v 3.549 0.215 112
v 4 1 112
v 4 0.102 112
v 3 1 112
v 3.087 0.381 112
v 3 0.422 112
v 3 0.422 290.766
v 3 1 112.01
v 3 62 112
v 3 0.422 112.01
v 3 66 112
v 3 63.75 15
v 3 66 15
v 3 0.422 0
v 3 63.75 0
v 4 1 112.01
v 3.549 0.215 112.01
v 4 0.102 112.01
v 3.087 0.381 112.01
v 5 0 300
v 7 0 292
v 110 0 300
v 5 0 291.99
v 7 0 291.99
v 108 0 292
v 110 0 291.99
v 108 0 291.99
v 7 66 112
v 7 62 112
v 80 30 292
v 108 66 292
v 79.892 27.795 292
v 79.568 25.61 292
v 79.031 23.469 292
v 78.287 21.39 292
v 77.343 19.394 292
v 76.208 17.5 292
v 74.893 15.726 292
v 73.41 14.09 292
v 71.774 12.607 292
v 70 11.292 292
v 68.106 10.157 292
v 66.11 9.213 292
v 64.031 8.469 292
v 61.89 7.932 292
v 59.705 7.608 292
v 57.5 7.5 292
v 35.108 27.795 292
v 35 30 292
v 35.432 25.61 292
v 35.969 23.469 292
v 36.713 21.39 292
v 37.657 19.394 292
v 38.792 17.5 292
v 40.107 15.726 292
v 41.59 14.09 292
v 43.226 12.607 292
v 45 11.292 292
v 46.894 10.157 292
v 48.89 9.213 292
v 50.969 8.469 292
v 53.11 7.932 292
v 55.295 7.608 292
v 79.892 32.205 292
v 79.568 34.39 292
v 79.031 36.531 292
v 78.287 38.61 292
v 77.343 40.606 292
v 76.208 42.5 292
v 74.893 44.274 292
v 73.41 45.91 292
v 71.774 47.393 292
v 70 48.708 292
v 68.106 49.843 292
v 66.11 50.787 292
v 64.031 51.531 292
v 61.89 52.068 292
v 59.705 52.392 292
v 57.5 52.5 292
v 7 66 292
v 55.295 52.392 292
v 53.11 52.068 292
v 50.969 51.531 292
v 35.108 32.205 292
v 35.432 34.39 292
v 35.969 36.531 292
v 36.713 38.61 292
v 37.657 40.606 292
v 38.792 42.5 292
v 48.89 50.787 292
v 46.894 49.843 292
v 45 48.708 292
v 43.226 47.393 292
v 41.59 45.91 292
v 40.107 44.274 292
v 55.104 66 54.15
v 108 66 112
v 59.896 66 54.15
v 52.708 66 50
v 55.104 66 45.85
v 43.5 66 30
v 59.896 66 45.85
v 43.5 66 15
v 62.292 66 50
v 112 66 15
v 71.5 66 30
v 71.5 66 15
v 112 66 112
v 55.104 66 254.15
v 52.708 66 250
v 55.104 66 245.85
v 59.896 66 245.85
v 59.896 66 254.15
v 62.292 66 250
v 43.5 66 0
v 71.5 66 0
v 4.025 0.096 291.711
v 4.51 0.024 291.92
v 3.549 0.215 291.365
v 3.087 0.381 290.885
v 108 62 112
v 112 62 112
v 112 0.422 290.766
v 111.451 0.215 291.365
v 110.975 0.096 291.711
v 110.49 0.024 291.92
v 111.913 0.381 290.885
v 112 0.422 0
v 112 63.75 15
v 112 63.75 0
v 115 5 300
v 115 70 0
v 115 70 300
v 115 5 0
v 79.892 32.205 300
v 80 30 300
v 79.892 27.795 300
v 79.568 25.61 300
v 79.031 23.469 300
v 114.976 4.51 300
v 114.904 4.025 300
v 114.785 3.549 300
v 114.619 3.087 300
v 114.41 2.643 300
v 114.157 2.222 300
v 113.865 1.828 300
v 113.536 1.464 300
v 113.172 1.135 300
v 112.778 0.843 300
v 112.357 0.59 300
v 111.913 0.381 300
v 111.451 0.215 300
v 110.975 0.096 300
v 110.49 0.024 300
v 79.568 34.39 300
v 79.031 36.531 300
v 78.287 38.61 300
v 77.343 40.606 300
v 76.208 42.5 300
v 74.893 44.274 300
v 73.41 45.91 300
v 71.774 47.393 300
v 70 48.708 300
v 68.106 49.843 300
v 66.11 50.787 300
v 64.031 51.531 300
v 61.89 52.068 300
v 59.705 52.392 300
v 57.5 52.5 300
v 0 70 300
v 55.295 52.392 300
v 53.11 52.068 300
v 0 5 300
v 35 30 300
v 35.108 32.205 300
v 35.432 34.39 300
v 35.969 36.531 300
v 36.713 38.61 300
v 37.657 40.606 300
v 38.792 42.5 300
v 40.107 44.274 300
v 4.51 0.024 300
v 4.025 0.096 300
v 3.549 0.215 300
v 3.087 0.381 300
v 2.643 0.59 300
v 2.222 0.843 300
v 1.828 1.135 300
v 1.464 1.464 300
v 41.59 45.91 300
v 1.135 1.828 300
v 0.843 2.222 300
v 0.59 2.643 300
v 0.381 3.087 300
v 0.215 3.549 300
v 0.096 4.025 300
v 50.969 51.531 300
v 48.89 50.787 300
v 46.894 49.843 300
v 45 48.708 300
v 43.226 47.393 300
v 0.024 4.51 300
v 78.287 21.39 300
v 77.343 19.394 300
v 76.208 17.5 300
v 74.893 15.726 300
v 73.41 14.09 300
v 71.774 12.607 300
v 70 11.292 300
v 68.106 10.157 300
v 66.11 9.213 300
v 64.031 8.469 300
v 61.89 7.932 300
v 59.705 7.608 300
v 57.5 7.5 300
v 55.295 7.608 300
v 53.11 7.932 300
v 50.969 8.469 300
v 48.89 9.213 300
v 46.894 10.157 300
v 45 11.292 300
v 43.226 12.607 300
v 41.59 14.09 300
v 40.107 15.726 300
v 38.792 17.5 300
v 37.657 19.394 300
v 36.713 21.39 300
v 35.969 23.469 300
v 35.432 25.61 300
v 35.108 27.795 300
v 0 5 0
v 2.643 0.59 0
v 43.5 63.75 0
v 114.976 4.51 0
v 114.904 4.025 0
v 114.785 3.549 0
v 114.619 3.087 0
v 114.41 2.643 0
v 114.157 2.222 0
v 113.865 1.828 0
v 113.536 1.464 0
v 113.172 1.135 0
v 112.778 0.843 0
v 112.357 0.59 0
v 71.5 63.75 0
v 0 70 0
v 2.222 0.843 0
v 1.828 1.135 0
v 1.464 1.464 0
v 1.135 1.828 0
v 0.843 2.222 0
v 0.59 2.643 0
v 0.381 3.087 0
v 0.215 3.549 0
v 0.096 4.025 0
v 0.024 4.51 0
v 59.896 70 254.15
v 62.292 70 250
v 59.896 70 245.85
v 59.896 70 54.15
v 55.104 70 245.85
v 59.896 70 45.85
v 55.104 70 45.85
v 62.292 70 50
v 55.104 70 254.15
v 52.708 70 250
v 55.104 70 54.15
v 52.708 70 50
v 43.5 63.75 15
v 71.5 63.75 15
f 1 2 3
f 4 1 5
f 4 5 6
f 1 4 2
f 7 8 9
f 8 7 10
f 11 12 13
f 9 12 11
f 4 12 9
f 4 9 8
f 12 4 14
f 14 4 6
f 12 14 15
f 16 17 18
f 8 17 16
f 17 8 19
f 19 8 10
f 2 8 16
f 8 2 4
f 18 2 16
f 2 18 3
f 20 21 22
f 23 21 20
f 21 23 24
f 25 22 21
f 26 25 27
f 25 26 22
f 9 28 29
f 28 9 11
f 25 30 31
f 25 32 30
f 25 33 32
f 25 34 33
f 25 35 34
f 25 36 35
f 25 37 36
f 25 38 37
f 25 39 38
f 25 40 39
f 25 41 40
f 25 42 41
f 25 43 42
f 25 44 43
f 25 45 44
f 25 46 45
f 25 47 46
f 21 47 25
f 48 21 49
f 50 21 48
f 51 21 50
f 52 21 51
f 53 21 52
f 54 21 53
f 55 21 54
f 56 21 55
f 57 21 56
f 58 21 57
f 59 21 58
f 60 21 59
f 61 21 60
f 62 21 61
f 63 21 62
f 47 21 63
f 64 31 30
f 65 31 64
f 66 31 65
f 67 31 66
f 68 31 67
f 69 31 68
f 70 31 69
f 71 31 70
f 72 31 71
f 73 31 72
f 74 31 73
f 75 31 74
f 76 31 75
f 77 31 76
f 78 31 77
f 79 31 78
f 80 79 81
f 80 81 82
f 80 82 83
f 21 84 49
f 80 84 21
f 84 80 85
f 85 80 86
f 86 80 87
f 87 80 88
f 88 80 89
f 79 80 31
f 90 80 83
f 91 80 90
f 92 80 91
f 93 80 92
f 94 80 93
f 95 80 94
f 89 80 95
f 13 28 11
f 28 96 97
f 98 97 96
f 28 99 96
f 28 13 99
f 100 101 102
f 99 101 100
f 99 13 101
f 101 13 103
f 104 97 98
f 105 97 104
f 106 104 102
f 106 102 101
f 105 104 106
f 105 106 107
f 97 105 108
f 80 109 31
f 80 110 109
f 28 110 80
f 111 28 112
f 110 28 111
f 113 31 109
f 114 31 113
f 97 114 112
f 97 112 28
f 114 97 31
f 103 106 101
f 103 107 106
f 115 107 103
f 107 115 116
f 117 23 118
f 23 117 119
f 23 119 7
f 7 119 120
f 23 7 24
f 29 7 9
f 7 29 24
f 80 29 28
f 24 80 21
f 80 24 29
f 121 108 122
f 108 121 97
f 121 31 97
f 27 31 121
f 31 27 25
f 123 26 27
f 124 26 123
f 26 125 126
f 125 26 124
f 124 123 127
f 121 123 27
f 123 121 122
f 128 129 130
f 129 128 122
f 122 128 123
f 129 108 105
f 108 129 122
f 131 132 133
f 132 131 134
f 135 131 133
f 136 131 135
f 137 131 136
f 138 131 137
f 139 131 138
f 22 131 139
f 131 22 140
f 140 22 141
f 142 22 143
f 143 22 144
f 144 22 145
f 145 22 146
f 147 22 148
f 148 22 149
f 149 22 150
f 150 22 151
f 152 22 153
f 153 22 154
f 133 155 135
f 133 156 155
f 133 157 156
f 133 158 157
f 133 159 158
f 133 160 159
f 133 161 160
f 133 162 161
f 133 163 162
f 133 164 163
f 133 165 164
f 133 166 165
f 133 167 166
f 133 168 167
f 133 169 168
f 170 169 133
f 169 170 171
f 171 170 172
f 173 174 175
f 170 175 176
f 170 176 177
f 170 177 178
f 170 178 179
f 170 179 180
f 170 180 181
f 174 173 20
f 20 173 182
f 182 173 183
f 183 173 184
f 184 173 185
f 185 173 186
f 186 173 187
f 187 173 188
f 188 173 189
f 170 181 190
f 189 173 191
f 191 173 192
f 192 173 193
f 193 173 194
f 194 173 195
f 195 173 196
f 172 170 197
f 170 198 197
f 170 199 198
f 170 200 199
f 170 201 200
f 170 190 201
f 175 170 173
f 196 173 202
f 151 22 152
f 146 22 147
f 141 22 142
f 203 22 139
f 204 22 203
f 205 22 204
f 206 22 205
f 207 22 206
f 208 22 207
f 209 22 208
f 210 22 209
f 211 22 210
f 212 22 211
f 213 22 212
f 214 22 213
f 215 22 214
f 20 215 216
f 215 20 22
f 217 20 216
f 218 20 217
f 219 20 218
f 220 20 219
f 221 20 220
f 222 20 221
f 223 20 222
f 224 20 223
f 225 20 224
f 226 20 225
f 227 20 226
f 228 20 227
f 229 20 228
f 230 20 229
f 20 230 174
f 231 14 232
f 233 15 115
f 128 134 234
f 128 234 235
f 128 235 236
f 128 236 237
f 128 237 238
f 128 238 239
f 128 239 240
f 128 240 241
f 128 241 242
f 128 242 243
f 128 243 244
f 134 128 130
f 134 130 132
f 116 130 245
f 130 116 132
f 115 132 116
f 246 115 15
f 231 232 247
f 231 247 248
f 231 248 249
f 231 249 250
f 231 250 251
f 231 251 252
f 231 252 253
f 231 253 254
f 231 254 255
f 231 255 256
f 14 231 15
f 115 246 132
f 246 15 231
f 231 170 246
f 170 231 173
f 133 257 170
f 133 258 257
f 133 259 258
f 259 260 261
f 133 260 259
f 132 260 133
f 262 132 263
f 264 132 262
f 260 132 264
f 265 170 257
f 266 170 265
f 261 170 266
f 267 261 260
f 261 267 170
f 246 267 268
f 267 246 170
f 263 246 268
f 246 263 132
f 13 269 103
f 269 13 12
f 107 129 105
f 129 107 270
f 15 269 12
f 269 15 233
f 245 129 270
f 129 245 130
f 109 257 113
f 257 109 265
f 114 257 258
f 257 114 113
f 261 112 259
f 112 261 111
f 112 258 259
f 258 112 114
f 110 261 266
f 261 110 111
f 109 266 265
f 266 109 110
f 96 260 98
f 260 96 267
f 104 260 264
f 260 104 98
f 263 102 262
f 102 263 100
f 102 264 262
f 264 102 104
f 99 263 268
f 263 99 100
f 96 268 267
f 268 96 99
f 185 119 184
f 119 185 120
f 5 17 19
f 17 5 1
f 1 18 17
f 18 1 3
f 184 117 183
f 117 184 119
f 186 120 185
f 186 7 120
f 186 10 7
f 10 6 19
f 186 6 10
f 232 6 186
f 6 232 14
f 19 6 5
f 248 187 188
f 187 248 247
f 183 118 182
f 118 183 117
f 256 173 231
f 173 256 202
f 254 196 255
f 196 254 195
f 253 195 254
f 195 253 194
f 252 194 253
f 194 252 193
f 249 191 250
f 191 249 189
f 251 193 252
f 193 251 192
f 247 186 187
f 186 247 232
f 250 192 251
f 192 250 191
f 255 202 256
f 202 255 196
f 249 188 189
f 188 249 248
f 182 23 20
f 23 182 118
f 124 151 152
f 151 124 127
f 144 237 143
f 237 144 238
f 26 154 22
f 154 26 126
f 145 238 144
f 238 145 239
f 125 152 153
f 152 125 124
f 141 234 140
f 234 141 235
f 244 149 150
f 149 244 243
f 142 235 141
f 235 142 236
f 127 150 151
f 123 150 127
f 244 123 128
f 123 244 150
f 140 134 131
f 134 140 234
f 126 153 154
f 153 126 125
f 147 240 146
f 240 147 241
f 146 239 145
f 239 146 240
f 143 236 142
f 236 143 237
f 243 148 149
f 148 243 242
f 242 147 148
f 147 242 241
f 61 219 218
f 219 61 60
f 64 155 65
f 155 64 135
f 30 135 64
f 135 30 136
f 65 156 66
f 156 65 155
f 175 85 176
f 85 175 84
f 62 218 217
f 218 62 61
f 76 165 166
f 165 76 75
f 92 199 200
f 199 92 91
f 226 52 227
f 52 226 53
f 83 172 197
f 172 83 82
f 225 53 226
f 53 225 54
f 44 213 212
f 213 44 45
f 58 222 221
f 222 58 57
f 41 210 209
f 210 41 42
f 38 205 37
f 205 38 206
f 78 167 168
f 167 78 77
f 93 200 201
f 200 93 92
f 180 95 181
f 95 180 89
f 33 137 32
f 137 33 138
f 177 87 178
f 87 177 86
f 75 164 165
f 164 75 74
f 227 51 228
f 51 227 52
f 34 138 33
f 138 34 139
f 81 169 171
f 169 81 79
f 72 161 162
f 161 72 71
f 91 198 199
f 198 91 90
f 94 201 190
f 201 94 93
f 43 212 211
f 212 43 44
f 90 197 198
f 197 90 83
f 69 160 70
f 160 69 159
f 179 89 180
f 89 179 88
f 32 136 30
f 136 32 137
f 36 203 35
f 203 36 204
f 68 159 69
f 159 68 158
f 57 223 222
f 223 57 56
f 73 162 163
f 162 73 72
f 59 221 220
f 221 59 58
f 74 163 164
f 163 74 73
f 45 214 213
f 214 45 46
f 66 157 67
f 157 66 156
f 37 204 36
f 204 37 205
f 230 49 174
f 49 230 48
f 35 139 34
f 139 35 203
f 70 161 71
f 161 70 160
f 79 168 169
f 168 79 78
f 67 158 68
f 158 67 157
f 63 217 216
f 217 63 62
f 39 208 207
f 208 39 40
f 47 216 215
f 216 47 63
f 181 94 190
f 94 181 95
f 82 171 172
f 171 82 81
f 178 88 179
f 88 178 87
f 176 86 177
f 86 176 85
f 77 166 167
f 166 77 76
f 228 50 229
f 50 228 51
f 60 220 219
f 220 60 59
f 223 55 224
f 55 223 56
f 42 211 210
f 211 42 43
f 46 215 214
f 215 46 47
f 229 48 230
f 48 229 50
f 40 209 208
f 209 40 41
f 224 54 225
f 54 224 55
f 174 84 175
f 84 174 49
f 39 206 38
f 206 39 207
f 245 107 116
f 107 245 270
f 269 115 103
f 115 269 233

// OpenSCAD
// === DESCRIPTION ===
// Hand Pump Wall Mount Bracket: L-shaped bracket that mounts a Camec/Breha
// hand sink pump to a metal wall inside a camp trailer.
//
// Physical context: Bolted to a vertical metal wall. The pump threads through
// a 32mm hole in the top shelf via a plastic bolt underneath. A curved hose
// exits downward from the pump barb. The user pumps the handle up and down
// repeatedly, creating significant cyclic downward and forward forces on the
// top shelf. The pump body hangs 200mm below the mounting hole, plus 100mm
// hose clearance below that.
//
// Design decisions:
//   - L-bracket with side gusset webs (not centre gusset): the pump body
//     hangs through the centre so the middle must be completely clear.
//     Triangular side webs on left and right walls provide the bracing.
//   - Open front: full hand access to tighten tap nut under shelf and
//     wall bolt nuts on back plate
//   - Printed on its back (back plate = build plate): layers are in the XY
//     plane so pumping loads (downward on shelf) are shear across layers,
//     not delamination tension. Side webs print without supports.
//   - Two wall-mount bolt holes with hex nut traps on inside face of back
//     plate — bolt from behind wall, nut captured in trap, tightened with
//     a socket/spanner from the front through the open bracket
//   - Bottom centre slot for hose routing
//   - All corners rounded (min 3mm radius), all edges chamfered
//
// In OpenSCAD preview: you see the bracket from the open/front side.
//   X = width (left-right), Y = depth (front-back, 0=front, max=wall),
//   Z = height (0=bottom edge, max=top where pump mounts).
//
// NOTE: Model is in USE orientation for preview. For print orientation,
// set view = "print" — rotates so back plate is on the build plate.
//
// Terminology -> code:
//   "back plate"      -> back_thick, back_plate()
//   "shelf" / "top"   -> shelf_thick, shelf()
//   "side walls"      -> side_thick, left_wall(), right_wall()
//   "side gussets"    -> gusset_thick, side_gussets()
//   "pump hole"       -> tap_hole_dia, tap_hole_from_wall
//   "tap nut"         -> tap_nut_dia, tap_nut_depth
//   "wall bolts"      -> wall_bolt_dia, upper_bolt_z, lower_bolt_z
//   "nut traps"       -> nut_trap_af, nut_trap_depth
//   "hose slot"       -> hose_slot_width, hose_slot_depth
//   "corner radius"   -> corner_r
//
// Common modifications:
//   Bigger pump hole       -> tap_hole_dia (add 0.3mm for PETG tolerance)
//   Move pump hole         -> tap_hole_from_wall (distance from back wall)
//   Change wall bolt size  -> wall_bolt_dia, nut_trap_af (M5=8mm AF, M6=10mm AF)
//   Move bolt positions    -> upper_bolt_z, lower_bolt_z (keep >=25mm from edges)
//   Wider hose slot        -> hose_slot_width
//   Thicker side walls     -> side_thick (must be multiple of extrusion_width)
//   Thicker gussets        -> gusset_thick (wider side webs)
//
// Overall dimensions: 115 x 70 x 300 mm (fits Bambu X1C 256x256x256 in
//   print orientation: 115 x 300 x 70 on the bed)
// Coordinate system: X = width, Y = depth (wall at back), Z = height
//   Z=0 is bottom of bracket in use-view. Build plate is the back face.

// === PRINT SETTINGS ===
// Material: PETG
// Nozzle Temp: 240C (structural, max layer bond)
// Bed Temp: 80C
// Layer Height: 0.2mm
// Walls/Perimeters: 5 (2.25mm wall thickness)
// Infill: 20% gyroid
// Supports: None required (printed on back, all overhangs self-supporting)
// Orientation: Back plate flat on build plate (rotate -90 deg around X from
//   use orientation). Set view = "print" in the file to preview this.
// Cooling: 30-40% fan (PETG standard)
// Notes: Dry PETG before printing (60-65C, 4-6 hours). Print time ~6-8 hours.

// === PARAMETERS ===
// Printer settings
nozzle_diameter = 0.4;
layer_height = 0.2;
build_x = 256;
build_y = 256;
build_z = 256;

// Main dimensions (max envelope: 300h x 115w x 70d)
bracket_height = 300;    // total height
bracket_width  = 115;    // total width (left-right)
bracket_depth  = 70;     // total depth (front-to-wall)

// Wall thicknesses
wall_thick = 2.25;       // general wall reference (5 perimeters)
shelf_thick = 8;         // top shelf — thick for pump mount rigidity
back_thick = 4;          // back plate — needs depth for nut traps
side_thick = 3;          // side walls — structural, carry gusset loads
gusset_thick = 4;        // side gusset web thickness (Y-direction slab)

// Pump mounting
tap_hole_dia = 32.3;     // 32mm + 0.3mm PETG tolerance
tap_hole_from_wall = 40; // centre of hole to wall (back face)
// Recess for plastic nut under shelf
tap_nut_dia = 45;        // estimated nut OD — measure and adjust
tap_nut_depth = 8;       // depth of recess for nut

// Wall mounting bolts (M5 bolts)
wall_bolt_dia = 5.3;     // M5 + 0.3mm tolerance
upper_bolt_z = bracket_height - 50;  // 50mm from top (as specified)
lower_bolt_z = 50;                    // 50mm from bottom for stability

// M5 hex nut trap dimensions
nut_trap_af = 8.3;       // M5 nut across-flats + 0.3mm tolerance (8mm nominal)
nut_trap_depth = 4.5;    // M5 nut thickness (4mm) + 0.5mm clearance
nut_trap_corner_r = 0.5; // slight radius to help nut seat

// Hose routing
hose_slot_width = 28;    // width of bottom hose slot (generous for hose + clamp)
hose_slot_height = 30;   // height of the hose slot opening at bottom

// Side gusset geometry
// Gussets are triangular webs filling the inside corner between shelf and
// back plate, on each side wall. They taper from full depth at the top
// (where shelf meets back) down to nothing partway down the height.
gusset_height = 180;     // how far down from shelf the gusset extends

// Aesthetics
corner_r = 5;            // external corner radius
fillet_r = 3;            // internal fillet radius

// === DERIVED CONSTANTS ===
extrusion_width = nozzle_diameter * 1.125; // 0.45mm
fudge = 0.01;
tolerance = 0.3;  // PETG sliding fit
ef_chamfer = 0.4; // elephant foot compensation
$fn = $preview ? 32 : 64;

// Tap hole Y position (from front face)
tap_hole_y = bracket_depth - tap_hole_from_wall;

// === HELPER MODULES ===

// Hexagonal prism for nut traps (across-flats dimension)
module hex_prism(af, h) {
    // af = across-flats distance
    r = af / 2 / cos(30);  // across-corners radius
    cylinder(h=h, r=r, $fn=6);
}

// === MAIN BODY ===

module back_plate() {
    translate([0, bracket_depth - back_thick, 0])
        cube([bracket_width, back_thick, bracket_height]);
}

module shelf() {
    translate([0, 0, bracket_height - shelf_thick])
        cube([bracket_width, bracket_depth, shelf_thick]);
}

module left_wall() {
    cube([side_thick, bracket_depth, bracket_height]);
}

module right_wall() {
    translate([bracket_width - side_thick, 0, 0])
        cube([side_thick, bracket_depth, bracket_height]);
}

module side_gussets() {
    // Triangular webs on left and right inner faces of side walls.
    // Each gusset is a right triangle:
    //   - Top edge along the underside of the shelf (full depth)
    //   - Back edge along the inner face of the back plate (gusset_height tall)
    //   - Hypotenuse from front-top to back-bottom of the triangle
    //
    // The gusset sits inside the bracket, against the side wall.

    gusset_top_z = bracket_height - shelf_thick;
    gusset_bottom_z = gusset_top_z - gusset_height;
    inner_depth = bracket_depth - back_thick;  // available depth from front to back plate

    // Left gusset — against inner face of left wall
    translate([side_thick, 0, gusset_bottom_z]) {
        linear_extrude(height=fudge)  // dummy — using polyhedron instead
            square(1);  // placeholder
    }

    // Build as a hull of thin slabs — simpler and reliable
    // Left gusset
    translate([side_thick, 0, 0]) {
        hull() {
            // Top-front edge (under shelf, at front)
            translate([0, 0, gusset_top_z - fudge])
                cube([gusset_thick, inner_depth, fudge]);
            // Bottom-back edge (at back plate, at bottom of gusset)
            translate([0, inner_depth - gusset_thick, gusset_bottom_z])
                cube([gusset_thick, gusset_thick, fudge]);
        }
    }

    // Right gusset
    translate([bracket_width - side_thick - gusset_thick, 0, 0]) {
        hull() {
            // Top-front edge (under shelf, at front)
            translate([0, 0, gusset_top_z - fudge])
                cube([gusset_thick, inner_depth, fudge]);
            // Bottom-back edge
            translate([0, inner_depth - gusset_thick, gusset_bottom_z])
                cube([gusset_thick, gusset_thick, fudge]);
        }
    }
}

// Bottom rail connecting side walls (behind hose slot area)
module bottom_rail() {
    rail_height = 15;
    rail_thick = wall_thick;
    // A cross-brace at the bottom, behind where the hose exits
    translate([0, bracket_depth - back_thick - rail_thick, 0])
        cube([bracket_width, rail_thick, rail_height]);
}

// === CUTOUTS ===

module tap_hole() {
    // Through-hole in shelf for pump mounting
    translate([bracket_width/2, tap_hole_y, bracket_height - shelf_thick - fudge])
        cylinder(h = shelf_thick + 2*fudge, d = tap_hole_dia);
}

module tap_nut_recess() {
    // Recess underneath shelf for the threaded plastic nut.
    // Accessible from below through the open front of the bracket.
    translate([bracket_width/2, tap_hole_y, bracket_height - shelf_thick - fudge])
        cylinder(h = tap_nut_depth + fudge, d = tap_nut_dia);
}

module wall_bolt_holes() {
    // Through-holes in back plate for wall mounting bolts.
    // Bolts insert from behind the wall, nuts captured in hex traps
    // on the inside face of the back plate.

    for (bolt_z = [upper_bolt_z, lower_bolt_z]) {
        // Bolt shaft hole — all the way through back plate
        translate([bracket_width/2, bracket_depth - back_thick - fudge, bolt_z])
            rotate([-90, 0, 0])
                cylinder(h = back_thick + 2*fudge, d = wall_bolt_dia);

        // Hex nut trap on inside face of back plate
        // Recessed into the back plate from the inside (front-facing side)
        translate([bracket_width/2, bracket_depth - back_thick - fudge, bolt_z])
            rotate([-90, 0, 0])
                hex_prism(af = nut_trap_af, h = nut_trap_depth + fudge);
    }
}

module hose_slot() {
    // Bottom centre opening for hose routing.
    // Cut from the bottom edge, open at front.
    translate([(bracket_width - hose_slot_width)/2, -fudge, -fudge])
        cube([hose_slot_width, bracket_depth - back_thick + fudge, hose_slot_height + fudge]);
}

// === EDGE TREATMENT ===

module round_front_corners() {
    // Round the two front vertical corners of the bracket

    r = corner_r;
    h = bracket_height + 2*fudge;

    // Front-left corner
    translate([r, r, -fudge])
    difference() {
        translate([-r - fudge, -r - fudge, 0]) cube([r + fudge, r + fudge, h]);
        cylinder(r=r, h=h);
    }

    // Front-right corner
    translate([bracket_width - r, r, -fudge])
    difference() {
        translate([0, -r - fudge, 0]) cube([r + fudge, r + fudge, h]);
        cylinder(r=r, h=h);
    }
}

// === ASSEMBLY ===

module bracket_body() {
    union() {
        back_plate();
        shelf();
        left_wall();
        right_wall();
        side_gussets();
        bottom_rail();
    }
}

module bracket_cuts() {
    tap_hole();
    tap_nut_recess();
    wall_bolt_holes();
    hose_slot();
    round_front_corners();
}

module bracket() {
    difference() {
        bracket_body();
        bracket_cuts();
    }
}

// === PRINT ORIENTATION ===

module print_orientation() {
    // Rotate so back face (Y=bracket_depth) sits on Z=0 (build plate)
    translate([0, bracket_height, 0])
    rotate([90, 0, 0])
        bracket();
}

// === RENDER ===
// Use-view: looking at bracket from front, pump hole at top
// Toggle between use-view and print-view:

view = "use";  // "use" = design review, "print" = print orientation

if (view == "use") {
    bracket();
} else {
    print_orientation();
}
